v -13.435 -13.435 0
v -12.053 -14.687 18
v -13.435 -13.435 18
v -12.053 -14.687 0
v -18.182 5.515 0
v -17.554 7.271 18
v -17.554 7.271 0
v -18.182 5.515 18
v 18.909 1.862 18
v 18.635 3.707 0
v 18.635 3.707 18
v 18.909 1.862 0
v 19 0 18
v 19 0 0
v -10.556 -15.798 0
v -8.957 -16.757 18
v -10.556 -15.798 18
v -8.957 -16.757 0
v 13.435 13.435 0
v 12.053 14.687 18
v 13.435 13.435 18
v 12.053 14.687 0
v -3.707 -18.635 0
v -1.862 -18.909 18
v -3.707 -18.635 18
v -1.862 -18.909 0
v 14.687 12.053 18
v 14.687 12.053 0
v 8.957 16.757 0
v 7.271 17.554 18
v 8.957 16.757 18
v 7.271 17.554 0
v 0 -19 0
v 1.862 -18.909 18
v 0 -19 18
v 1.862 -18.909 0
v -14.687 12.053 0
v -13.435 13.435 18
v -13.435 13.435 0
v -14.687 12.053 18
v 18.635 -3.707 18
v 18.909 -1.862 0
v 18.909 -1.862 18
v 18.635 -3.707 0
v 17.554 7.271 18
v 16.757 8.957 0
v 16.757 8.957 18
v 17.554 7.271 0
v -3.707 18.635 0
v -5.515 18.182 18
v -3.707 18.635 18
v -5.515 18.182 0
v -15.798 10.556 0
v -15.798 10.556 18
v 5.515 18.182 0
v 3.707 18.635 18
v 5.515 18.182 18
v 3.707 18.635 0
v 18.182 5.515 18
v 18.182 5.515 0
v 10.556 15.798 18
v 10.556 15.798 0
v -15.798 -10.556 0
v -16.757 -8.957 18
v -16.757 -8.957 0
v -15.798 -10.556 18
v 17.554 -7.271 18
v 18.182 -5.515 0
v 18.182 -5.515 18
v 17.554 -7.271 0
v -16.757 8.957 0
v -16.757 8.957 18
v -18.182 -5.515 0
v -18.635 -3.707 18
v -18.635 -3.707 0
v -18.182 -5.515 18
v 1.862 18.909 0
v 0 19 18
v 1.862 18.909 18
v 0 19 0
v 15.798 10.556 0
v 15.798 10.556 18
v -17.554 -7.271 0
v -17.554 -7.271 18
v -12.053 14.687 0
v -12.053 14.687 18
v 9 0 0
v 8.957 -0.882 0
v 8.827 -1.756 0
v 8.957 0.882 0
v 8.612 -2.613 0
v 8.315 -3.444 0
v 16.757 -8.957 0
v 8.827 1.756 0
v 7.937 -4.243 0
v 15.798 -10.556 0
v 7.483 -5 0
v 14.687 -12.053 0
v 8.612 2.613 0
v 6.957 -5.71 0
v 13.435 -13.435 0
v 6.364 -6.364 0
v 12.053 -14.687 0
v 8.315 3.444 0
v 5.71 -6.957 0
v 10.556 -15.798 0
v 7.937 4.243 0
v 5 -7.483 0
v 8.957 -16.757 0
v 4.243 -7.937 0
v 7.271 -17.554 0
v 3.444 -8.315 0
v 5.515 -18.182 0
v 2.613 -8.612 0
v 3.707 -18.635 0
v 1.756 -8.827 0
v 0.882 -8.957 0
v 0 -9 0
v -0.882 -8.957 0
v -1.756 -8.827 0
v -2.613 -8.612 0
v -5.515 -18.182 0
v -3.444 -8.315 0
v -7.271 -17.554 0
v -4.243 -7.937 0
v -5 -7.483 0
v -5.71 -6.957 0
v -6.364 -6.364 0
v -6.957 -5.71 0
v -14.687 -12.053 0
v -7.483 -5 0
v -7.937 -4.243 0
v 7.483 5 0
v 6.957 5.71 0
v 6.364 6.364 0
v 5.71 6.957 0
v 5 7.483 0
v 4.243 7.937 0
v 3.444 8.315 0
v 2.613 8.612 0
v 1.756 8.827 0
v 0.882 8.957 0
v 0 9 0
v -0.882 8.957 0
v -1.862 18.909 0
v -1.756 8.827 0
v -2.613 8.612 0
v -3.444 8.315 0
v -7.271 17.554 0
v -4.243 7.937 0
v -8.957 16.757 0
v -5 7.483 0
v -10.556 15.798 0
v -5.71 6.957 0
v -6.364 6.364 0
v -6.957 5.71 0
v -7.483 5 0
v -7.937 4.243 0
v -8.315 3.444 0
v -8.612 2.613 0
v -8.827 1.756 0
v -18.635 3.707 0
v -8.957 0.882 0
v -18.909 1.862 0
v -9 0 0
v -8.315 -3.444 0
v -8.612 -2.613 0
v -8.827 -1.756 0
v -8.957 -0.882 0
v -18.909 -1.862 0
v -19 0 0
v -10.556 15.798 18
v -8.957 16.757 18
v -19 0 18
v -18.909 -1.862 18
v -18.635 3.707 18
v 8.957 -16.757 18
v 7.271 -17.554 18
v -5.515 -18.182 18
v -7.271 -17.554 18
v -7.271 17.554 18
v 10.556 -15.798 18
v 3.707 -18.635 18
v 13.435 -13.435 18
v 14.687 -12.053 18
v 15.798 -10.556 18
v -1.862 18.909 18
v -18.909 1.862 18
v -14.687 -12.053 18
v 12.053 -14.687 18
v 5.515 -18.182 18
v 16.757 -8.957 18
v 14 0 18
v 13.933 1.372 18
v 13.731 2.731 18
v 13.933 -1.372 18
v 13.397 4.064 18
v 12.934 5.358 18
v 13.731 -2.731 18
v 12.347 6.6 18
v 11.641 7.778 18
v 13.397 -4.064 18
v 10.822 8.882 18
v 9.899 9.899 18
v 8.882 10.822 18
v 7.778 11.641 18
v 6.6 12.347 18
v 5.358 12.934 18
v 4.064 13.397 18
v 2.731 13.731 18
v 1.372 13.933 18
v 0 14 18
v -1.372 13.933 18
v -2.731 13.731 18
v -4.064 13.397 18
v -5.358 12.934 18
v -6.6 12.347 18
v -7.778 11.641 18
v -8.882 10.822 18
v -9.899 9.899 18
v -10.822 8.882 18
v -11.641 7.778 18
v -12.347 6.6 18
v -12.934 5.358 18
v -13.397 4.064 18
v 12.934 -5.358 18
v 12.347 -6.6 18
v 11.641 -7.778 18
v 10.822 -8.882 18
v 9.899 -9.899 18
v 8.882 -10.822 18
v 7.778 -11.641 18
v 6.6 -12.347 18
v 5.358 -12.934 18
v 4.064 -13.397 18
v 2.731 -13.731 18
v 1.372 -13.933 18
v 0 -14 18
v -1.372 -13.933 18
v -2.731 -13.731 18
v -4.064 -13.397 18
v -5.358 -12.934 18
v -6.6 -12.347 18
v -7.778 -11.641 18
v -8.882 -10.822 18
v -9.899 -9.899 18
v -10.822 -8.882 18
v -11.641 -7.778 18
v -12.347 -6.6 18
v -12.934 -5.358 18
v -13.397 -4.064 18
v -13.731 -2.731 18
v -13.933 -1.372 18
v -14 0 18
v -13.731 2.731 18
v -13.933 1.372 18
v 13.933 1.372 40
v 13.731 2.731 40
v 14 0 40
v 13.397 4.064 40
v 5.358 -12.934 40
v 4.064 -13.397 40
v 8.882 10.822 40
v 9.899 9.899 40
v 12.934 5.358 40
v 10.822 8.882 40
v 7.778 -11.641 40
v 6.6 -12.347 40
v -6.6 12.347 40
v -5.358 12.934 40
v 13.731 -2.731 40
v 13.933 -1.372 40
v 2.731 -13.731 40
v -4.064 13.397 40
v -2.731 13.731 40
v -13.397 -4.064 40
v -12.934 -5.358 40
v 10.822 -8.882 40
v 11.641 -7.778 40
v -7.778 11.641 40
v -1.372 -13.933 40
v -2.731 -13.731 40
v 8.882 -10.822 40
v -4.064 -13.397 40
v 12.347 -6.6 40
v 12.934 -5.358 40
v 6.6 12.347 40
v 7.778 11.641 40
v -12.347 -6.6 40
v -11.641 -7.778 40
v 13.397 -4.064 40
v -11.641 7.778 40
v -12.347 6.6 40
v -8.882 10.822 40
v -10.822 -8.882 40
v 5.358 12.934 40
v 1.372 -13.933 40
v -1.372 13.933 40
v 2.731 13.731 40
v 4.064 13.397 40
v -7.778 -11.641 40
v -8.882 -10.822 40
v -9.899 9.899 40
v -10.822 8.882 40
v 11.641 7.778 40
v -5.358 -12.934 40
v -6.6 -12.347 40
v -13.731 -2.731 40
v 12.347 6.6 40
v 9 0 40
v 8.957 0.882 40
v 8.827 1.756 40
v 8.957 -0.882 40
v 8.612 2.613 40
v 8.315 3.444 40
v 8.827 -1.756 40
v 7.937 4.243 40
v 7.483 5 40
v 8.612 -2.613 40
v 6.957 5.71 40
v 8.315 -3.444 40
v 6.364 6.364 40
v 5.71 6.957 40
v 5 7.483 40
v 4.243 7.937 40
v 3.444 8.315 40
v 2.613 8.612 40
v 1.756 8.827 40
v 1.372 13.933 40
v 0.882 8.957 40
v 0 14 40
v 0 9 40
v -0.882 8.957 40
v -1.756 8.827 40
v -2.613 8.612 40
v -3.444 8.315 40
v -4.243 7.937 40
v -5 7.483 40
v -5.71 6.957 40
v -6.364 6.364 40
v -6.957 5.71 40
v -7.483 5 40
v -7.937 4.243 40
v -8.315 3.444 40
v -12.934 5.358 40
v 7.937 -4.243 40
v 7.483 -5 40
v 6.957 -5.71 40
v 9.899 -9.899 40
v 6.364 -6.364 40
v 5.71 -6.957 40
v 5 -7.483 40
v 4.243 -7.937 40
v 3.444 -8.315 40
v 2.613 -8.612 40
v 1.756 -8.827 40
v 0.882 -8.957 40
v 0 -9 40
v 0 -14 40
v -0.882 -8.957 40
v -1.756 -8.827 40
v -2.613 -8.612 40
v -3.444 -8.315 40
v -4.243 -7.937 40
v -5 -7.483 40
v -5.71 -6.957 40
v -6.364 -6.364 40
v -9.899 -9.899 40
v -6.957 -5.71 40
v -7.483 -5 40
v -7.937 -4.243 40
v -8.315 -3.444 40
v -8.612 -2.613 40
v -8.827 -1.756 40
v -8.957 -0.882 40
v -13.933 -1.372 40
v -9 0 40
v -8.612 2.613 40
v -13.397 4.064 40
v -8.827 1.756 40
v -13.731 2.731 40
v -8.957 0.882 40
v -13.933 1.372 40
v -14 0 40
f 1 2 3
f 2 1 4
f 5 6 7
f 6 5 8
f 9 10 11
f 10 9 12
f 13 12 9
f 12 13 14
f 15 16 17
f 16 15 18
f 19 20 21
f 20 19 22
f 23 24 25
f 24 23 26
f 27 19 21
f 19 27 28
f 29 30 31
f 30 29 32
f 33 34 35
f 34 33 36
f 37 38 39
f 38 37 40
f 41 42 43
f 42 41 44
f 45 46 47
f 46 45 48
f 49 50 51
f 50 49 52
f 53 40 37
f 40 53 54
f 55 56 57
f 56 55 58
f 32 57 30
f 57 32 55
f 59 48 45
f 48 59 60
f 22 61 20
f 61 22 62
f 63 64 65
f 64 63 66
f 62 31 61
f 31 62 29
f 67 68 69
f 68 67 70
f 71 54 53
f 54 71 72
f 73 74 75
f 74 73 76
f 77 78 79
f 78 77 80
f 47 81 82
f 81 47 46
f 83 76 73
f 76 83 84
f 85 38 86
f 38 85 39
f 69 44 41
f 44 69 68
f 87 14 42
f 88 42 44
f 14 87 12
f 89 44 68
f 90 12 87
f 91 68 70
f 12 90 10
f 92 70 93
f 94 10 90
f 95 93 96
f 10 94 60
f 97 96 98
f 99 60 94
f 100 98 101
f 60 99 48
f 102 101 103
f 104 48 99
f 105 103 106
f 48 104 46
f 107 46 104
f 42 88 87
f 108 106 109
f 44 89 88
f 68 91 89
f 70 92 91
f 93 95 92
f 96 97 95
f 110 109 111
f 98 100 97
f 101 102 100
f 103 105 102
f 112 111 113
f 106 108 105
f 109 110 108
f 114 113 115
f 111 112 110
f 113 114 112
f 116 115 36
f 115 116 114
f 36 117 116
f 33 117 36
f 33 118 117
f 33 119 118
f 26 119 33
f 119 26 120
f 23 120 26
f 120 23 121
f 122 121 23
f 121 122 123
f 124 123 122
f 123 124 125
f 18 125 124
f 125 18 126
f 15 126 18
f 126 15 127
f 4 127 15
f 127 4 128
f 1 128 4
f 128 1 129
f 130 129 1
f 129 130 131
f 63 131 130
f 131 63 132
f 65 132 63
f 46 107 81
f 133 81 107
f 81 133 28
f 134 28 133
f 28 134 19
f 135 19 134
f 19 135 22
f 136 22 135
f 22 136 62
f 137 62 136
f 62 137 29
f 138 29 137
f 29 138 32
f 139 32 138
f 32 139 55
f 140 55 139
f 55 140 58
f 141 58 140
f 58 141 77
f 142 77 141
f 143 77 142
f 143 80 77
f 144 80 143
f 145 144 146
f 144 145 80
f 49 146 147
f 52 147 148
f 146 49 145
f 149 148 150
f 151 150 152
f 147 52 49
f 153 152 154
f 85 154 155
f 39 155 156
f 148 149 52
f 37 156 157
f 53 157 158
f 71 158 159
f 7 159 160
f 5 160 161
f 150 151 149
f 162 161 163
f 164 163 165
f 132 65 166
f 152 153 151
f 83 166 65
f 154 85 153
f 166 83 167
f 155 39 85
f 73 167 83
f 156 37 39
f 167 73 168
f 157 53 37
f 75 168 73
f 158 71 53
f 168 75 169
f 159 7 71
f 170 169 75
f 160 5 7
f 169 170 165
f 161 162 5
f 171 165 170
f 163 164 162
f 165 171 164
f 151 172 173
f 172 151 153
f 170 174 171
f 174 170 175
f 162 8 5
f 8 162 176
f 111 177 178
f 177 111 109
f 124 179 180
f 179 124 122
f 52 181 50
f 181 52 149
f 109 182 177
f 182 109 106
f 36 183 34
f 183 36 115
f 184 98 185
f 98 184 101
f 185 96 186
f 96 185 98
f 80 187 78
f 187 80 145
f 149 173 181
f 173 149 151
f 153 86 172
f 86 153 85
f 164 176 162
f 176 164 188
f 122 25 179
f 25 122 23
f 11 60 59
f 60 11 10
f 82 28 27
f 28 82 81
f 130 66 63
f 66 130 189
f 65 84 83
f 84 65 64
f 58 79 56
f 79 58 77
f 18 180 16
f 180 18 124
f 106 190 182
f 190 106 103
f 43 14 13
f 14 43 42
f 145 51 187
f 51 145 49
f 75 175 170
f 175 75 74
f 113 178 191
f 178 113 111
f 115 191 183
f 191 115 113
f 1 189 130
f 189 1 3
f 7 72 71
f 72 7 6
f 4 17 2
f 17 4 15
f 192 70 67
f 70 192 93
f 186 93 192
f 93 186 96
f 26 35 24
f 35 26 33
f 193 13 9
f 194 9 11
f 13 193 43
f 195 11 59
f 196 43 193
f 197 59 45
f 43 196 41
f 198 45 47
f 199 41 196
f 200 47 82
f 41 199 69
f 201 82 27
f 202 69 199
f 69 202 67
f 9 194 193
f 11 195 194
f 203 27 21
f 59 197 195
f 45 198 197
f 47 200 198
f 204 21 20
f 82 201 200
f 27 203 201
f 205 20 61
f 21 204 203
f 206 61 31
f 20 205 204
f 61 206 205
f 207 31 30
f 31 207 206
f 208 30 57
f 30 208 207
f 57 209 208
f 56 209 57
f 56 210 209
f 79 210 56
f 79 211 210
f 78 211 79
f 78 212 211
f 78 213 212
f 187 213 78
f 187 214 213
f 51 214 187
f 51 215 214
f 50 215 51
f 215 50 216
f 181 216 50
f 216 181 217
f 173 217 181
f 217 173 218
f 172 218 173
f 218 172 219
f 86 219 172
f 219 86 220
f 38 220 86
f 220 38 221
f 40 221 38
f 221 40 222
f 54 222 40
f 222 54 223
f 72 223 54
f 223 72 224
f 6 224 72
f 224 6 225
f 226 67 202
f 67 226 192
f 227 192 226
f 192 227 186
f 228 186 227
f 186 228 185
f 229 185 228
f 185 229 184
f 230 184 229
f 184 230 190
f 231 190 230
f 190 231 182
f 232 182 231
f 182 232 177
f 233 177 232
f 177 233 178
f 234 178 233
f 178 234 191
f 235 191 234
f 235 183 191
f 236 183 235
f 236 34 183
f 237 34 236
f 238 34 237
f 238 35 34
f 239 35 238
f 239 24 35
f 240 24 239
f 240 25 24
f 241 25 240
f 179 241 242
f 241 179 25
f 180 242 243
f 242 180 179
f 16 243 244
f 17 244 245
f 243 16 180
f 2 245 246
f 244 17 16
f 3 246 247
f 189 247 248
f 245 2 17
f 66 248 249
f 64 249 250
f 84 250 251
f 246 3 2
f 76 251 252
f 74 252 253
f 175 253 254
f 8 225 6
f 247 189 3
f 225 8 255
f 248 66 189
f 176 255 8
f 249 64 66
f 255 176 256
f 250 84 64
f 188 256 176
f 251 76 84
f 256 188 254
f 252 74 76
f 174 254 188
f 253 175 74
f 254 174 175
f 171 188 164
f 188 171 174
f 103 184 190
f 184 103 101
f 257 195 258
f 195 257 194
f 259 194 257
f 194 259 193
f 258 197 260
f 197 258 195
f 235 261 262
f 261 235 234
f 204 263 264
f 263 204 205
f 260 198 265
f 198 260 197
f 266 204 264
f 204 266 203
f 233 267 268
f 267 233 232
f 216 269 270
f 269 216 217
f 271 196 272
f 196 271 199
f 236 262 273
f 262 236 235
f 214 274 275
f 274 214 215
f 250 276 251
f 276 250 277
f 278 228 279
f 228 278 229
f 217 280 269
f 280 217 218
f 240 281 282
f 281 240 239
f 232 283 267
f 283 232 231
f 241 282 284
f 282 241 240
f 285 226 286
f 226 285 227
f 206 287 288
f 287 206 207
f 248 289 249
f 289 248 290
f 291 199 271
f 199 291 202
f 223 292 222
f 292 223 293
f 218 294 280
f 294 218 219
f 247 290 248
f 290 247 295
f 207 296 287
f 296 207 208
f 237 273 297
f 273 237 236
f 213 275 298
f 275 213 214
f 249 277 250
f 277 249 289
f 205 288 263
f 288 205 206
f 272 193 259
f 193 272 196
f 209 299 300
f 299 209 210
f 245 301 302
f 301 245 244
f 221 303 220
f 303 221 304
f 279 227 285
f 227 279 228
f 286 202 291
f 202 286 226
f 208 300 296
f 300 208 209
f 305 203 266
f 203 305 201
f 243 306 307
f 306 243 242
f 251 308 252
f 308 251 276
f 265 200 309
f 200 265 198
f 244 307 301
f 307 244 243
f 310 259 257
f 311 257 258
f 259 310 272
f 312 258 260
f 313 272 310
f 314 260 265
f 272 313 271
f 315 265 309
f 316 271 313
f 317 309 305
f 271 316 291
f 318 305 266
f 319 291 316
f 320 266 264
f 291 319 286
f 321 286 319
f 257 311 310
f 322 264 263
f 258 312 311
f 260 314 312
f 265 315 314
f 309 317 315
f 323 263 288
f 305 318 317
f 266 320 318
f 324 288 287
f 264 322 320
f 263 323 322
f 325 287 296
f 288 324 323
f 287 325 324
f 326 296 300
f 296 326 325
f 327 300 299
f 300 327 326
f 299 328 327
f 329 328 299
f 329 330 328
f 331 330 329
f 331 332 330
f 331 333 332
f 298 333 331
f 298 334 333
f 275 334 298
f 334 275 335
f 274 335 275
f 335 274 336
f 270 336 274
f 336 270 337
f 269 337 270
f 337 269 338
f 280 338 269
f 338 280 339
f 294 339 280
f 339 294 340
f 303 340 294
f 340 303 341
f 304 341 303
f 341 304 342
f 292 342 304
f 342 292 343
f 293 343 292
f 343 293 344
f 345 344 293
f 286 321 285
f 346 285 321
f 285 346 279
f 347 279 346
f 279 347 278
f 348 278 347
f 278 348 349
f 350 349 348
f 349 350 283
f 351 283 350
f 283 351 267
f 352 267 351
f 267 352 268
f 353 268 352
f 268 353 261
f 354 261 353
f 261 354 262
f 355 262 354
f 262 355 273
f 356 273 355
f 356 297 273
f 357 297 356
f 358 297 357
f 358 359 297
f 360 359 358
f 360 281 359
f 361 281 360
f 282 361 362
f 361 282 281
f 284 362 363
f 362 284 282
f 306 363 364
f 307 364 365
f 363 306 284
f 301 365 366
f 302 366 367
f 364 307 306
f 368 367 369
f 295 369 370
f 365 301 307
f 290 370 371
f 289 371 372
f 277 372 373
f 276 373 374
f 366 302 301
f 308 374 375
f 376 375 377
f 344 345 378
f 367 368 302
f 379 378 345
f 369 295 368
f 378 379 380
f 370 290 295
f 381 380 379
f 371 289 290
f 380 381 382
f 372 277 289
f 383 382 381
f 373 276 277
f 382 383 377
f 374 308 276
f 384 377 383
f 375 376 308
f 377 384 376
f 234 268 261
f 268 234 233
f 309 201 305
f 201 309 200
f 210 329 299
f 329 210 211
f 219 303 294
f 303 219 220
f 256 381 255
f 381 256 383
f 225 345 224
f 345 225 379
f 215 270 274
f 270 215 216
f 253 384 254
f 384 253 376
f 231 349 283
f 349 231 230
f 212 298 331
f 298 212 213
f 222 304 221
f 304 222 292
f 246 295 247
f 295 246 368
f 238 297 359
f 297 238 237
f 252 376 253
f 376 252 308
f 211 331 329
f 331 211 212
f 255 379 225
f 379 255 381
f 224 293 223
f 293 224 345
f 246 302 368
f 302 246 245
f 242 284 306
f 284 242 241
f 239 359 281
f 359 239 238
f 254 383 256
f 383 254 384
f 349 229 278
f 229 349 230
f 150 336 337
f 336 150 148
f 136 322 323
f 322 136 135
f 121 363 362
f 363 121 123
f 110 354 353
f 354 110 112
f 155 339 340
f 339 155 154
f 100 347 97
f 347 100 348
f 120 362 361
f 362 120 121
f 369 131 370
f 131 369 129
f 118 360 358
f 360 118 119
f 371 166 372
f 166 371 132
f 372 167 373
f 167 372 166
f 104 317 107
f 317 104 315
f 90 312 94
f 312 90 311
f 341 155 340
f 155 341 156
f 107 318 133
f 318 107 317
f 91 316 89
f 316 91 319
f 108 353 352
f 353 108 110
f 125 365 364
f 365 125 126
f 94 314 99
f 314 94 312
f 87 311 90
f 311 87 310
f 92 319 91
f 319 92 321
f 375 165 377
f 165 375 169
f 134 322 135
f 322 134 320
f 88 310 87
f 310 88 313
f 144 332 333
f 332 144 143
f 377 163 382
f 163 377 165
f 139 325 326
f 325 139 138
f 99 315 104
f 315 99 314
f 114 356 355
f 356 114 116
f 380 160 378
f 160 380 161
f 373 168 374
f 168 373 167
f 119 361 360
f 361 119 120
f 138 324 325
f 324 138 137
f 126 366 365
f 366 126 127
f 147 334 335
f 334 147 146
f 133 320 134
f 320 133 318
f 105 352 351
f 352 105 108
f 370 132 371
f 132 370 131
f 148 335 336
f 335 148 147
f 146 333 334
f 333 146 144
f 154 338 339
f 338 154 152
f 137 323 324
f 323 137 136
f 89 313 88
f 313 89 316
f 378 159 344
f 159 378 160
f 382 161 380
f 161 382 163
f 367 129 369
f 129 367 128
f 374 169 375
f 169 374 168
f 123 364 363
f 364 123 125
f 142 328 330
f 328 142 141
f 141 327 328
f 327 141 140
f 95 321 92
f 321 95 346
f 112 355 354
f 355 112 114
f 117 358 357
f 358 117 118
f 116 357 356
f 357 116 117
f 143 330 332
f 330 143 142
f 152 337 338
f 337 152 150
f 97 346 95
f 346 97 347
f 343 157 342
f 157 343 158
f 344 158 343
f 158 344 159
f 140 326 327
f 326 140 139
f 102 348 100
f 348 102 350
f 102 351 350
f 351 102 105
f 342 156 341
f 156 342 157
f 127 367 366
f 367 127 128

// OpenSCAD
// Starter connector for task-004.
$fn = 64;

lower_od = 38;
upper_od = 28;
lower_height = 18;
transition_height = 0;
total_height = 40;
bore_diameter = 18;

difference() {
  union() {
    cylinder(h = lower_height, r = lower_od / 2);
    if (transition_height > 0) {
      translate([0, 0, lower_height])
        cylinder(h = transition_height, r1 = lower_od / 2, r2 = upper_od / 2);
    }
    translate([0, 0, lower_height + transition_height])
      cylinder(h = total_height - lower_height - transition_height, r = upper_od / 2);
  }

  translate([0, 0, -1])
    cylinder(h = total_height + 2, r = bore_diameter / 2);
}
